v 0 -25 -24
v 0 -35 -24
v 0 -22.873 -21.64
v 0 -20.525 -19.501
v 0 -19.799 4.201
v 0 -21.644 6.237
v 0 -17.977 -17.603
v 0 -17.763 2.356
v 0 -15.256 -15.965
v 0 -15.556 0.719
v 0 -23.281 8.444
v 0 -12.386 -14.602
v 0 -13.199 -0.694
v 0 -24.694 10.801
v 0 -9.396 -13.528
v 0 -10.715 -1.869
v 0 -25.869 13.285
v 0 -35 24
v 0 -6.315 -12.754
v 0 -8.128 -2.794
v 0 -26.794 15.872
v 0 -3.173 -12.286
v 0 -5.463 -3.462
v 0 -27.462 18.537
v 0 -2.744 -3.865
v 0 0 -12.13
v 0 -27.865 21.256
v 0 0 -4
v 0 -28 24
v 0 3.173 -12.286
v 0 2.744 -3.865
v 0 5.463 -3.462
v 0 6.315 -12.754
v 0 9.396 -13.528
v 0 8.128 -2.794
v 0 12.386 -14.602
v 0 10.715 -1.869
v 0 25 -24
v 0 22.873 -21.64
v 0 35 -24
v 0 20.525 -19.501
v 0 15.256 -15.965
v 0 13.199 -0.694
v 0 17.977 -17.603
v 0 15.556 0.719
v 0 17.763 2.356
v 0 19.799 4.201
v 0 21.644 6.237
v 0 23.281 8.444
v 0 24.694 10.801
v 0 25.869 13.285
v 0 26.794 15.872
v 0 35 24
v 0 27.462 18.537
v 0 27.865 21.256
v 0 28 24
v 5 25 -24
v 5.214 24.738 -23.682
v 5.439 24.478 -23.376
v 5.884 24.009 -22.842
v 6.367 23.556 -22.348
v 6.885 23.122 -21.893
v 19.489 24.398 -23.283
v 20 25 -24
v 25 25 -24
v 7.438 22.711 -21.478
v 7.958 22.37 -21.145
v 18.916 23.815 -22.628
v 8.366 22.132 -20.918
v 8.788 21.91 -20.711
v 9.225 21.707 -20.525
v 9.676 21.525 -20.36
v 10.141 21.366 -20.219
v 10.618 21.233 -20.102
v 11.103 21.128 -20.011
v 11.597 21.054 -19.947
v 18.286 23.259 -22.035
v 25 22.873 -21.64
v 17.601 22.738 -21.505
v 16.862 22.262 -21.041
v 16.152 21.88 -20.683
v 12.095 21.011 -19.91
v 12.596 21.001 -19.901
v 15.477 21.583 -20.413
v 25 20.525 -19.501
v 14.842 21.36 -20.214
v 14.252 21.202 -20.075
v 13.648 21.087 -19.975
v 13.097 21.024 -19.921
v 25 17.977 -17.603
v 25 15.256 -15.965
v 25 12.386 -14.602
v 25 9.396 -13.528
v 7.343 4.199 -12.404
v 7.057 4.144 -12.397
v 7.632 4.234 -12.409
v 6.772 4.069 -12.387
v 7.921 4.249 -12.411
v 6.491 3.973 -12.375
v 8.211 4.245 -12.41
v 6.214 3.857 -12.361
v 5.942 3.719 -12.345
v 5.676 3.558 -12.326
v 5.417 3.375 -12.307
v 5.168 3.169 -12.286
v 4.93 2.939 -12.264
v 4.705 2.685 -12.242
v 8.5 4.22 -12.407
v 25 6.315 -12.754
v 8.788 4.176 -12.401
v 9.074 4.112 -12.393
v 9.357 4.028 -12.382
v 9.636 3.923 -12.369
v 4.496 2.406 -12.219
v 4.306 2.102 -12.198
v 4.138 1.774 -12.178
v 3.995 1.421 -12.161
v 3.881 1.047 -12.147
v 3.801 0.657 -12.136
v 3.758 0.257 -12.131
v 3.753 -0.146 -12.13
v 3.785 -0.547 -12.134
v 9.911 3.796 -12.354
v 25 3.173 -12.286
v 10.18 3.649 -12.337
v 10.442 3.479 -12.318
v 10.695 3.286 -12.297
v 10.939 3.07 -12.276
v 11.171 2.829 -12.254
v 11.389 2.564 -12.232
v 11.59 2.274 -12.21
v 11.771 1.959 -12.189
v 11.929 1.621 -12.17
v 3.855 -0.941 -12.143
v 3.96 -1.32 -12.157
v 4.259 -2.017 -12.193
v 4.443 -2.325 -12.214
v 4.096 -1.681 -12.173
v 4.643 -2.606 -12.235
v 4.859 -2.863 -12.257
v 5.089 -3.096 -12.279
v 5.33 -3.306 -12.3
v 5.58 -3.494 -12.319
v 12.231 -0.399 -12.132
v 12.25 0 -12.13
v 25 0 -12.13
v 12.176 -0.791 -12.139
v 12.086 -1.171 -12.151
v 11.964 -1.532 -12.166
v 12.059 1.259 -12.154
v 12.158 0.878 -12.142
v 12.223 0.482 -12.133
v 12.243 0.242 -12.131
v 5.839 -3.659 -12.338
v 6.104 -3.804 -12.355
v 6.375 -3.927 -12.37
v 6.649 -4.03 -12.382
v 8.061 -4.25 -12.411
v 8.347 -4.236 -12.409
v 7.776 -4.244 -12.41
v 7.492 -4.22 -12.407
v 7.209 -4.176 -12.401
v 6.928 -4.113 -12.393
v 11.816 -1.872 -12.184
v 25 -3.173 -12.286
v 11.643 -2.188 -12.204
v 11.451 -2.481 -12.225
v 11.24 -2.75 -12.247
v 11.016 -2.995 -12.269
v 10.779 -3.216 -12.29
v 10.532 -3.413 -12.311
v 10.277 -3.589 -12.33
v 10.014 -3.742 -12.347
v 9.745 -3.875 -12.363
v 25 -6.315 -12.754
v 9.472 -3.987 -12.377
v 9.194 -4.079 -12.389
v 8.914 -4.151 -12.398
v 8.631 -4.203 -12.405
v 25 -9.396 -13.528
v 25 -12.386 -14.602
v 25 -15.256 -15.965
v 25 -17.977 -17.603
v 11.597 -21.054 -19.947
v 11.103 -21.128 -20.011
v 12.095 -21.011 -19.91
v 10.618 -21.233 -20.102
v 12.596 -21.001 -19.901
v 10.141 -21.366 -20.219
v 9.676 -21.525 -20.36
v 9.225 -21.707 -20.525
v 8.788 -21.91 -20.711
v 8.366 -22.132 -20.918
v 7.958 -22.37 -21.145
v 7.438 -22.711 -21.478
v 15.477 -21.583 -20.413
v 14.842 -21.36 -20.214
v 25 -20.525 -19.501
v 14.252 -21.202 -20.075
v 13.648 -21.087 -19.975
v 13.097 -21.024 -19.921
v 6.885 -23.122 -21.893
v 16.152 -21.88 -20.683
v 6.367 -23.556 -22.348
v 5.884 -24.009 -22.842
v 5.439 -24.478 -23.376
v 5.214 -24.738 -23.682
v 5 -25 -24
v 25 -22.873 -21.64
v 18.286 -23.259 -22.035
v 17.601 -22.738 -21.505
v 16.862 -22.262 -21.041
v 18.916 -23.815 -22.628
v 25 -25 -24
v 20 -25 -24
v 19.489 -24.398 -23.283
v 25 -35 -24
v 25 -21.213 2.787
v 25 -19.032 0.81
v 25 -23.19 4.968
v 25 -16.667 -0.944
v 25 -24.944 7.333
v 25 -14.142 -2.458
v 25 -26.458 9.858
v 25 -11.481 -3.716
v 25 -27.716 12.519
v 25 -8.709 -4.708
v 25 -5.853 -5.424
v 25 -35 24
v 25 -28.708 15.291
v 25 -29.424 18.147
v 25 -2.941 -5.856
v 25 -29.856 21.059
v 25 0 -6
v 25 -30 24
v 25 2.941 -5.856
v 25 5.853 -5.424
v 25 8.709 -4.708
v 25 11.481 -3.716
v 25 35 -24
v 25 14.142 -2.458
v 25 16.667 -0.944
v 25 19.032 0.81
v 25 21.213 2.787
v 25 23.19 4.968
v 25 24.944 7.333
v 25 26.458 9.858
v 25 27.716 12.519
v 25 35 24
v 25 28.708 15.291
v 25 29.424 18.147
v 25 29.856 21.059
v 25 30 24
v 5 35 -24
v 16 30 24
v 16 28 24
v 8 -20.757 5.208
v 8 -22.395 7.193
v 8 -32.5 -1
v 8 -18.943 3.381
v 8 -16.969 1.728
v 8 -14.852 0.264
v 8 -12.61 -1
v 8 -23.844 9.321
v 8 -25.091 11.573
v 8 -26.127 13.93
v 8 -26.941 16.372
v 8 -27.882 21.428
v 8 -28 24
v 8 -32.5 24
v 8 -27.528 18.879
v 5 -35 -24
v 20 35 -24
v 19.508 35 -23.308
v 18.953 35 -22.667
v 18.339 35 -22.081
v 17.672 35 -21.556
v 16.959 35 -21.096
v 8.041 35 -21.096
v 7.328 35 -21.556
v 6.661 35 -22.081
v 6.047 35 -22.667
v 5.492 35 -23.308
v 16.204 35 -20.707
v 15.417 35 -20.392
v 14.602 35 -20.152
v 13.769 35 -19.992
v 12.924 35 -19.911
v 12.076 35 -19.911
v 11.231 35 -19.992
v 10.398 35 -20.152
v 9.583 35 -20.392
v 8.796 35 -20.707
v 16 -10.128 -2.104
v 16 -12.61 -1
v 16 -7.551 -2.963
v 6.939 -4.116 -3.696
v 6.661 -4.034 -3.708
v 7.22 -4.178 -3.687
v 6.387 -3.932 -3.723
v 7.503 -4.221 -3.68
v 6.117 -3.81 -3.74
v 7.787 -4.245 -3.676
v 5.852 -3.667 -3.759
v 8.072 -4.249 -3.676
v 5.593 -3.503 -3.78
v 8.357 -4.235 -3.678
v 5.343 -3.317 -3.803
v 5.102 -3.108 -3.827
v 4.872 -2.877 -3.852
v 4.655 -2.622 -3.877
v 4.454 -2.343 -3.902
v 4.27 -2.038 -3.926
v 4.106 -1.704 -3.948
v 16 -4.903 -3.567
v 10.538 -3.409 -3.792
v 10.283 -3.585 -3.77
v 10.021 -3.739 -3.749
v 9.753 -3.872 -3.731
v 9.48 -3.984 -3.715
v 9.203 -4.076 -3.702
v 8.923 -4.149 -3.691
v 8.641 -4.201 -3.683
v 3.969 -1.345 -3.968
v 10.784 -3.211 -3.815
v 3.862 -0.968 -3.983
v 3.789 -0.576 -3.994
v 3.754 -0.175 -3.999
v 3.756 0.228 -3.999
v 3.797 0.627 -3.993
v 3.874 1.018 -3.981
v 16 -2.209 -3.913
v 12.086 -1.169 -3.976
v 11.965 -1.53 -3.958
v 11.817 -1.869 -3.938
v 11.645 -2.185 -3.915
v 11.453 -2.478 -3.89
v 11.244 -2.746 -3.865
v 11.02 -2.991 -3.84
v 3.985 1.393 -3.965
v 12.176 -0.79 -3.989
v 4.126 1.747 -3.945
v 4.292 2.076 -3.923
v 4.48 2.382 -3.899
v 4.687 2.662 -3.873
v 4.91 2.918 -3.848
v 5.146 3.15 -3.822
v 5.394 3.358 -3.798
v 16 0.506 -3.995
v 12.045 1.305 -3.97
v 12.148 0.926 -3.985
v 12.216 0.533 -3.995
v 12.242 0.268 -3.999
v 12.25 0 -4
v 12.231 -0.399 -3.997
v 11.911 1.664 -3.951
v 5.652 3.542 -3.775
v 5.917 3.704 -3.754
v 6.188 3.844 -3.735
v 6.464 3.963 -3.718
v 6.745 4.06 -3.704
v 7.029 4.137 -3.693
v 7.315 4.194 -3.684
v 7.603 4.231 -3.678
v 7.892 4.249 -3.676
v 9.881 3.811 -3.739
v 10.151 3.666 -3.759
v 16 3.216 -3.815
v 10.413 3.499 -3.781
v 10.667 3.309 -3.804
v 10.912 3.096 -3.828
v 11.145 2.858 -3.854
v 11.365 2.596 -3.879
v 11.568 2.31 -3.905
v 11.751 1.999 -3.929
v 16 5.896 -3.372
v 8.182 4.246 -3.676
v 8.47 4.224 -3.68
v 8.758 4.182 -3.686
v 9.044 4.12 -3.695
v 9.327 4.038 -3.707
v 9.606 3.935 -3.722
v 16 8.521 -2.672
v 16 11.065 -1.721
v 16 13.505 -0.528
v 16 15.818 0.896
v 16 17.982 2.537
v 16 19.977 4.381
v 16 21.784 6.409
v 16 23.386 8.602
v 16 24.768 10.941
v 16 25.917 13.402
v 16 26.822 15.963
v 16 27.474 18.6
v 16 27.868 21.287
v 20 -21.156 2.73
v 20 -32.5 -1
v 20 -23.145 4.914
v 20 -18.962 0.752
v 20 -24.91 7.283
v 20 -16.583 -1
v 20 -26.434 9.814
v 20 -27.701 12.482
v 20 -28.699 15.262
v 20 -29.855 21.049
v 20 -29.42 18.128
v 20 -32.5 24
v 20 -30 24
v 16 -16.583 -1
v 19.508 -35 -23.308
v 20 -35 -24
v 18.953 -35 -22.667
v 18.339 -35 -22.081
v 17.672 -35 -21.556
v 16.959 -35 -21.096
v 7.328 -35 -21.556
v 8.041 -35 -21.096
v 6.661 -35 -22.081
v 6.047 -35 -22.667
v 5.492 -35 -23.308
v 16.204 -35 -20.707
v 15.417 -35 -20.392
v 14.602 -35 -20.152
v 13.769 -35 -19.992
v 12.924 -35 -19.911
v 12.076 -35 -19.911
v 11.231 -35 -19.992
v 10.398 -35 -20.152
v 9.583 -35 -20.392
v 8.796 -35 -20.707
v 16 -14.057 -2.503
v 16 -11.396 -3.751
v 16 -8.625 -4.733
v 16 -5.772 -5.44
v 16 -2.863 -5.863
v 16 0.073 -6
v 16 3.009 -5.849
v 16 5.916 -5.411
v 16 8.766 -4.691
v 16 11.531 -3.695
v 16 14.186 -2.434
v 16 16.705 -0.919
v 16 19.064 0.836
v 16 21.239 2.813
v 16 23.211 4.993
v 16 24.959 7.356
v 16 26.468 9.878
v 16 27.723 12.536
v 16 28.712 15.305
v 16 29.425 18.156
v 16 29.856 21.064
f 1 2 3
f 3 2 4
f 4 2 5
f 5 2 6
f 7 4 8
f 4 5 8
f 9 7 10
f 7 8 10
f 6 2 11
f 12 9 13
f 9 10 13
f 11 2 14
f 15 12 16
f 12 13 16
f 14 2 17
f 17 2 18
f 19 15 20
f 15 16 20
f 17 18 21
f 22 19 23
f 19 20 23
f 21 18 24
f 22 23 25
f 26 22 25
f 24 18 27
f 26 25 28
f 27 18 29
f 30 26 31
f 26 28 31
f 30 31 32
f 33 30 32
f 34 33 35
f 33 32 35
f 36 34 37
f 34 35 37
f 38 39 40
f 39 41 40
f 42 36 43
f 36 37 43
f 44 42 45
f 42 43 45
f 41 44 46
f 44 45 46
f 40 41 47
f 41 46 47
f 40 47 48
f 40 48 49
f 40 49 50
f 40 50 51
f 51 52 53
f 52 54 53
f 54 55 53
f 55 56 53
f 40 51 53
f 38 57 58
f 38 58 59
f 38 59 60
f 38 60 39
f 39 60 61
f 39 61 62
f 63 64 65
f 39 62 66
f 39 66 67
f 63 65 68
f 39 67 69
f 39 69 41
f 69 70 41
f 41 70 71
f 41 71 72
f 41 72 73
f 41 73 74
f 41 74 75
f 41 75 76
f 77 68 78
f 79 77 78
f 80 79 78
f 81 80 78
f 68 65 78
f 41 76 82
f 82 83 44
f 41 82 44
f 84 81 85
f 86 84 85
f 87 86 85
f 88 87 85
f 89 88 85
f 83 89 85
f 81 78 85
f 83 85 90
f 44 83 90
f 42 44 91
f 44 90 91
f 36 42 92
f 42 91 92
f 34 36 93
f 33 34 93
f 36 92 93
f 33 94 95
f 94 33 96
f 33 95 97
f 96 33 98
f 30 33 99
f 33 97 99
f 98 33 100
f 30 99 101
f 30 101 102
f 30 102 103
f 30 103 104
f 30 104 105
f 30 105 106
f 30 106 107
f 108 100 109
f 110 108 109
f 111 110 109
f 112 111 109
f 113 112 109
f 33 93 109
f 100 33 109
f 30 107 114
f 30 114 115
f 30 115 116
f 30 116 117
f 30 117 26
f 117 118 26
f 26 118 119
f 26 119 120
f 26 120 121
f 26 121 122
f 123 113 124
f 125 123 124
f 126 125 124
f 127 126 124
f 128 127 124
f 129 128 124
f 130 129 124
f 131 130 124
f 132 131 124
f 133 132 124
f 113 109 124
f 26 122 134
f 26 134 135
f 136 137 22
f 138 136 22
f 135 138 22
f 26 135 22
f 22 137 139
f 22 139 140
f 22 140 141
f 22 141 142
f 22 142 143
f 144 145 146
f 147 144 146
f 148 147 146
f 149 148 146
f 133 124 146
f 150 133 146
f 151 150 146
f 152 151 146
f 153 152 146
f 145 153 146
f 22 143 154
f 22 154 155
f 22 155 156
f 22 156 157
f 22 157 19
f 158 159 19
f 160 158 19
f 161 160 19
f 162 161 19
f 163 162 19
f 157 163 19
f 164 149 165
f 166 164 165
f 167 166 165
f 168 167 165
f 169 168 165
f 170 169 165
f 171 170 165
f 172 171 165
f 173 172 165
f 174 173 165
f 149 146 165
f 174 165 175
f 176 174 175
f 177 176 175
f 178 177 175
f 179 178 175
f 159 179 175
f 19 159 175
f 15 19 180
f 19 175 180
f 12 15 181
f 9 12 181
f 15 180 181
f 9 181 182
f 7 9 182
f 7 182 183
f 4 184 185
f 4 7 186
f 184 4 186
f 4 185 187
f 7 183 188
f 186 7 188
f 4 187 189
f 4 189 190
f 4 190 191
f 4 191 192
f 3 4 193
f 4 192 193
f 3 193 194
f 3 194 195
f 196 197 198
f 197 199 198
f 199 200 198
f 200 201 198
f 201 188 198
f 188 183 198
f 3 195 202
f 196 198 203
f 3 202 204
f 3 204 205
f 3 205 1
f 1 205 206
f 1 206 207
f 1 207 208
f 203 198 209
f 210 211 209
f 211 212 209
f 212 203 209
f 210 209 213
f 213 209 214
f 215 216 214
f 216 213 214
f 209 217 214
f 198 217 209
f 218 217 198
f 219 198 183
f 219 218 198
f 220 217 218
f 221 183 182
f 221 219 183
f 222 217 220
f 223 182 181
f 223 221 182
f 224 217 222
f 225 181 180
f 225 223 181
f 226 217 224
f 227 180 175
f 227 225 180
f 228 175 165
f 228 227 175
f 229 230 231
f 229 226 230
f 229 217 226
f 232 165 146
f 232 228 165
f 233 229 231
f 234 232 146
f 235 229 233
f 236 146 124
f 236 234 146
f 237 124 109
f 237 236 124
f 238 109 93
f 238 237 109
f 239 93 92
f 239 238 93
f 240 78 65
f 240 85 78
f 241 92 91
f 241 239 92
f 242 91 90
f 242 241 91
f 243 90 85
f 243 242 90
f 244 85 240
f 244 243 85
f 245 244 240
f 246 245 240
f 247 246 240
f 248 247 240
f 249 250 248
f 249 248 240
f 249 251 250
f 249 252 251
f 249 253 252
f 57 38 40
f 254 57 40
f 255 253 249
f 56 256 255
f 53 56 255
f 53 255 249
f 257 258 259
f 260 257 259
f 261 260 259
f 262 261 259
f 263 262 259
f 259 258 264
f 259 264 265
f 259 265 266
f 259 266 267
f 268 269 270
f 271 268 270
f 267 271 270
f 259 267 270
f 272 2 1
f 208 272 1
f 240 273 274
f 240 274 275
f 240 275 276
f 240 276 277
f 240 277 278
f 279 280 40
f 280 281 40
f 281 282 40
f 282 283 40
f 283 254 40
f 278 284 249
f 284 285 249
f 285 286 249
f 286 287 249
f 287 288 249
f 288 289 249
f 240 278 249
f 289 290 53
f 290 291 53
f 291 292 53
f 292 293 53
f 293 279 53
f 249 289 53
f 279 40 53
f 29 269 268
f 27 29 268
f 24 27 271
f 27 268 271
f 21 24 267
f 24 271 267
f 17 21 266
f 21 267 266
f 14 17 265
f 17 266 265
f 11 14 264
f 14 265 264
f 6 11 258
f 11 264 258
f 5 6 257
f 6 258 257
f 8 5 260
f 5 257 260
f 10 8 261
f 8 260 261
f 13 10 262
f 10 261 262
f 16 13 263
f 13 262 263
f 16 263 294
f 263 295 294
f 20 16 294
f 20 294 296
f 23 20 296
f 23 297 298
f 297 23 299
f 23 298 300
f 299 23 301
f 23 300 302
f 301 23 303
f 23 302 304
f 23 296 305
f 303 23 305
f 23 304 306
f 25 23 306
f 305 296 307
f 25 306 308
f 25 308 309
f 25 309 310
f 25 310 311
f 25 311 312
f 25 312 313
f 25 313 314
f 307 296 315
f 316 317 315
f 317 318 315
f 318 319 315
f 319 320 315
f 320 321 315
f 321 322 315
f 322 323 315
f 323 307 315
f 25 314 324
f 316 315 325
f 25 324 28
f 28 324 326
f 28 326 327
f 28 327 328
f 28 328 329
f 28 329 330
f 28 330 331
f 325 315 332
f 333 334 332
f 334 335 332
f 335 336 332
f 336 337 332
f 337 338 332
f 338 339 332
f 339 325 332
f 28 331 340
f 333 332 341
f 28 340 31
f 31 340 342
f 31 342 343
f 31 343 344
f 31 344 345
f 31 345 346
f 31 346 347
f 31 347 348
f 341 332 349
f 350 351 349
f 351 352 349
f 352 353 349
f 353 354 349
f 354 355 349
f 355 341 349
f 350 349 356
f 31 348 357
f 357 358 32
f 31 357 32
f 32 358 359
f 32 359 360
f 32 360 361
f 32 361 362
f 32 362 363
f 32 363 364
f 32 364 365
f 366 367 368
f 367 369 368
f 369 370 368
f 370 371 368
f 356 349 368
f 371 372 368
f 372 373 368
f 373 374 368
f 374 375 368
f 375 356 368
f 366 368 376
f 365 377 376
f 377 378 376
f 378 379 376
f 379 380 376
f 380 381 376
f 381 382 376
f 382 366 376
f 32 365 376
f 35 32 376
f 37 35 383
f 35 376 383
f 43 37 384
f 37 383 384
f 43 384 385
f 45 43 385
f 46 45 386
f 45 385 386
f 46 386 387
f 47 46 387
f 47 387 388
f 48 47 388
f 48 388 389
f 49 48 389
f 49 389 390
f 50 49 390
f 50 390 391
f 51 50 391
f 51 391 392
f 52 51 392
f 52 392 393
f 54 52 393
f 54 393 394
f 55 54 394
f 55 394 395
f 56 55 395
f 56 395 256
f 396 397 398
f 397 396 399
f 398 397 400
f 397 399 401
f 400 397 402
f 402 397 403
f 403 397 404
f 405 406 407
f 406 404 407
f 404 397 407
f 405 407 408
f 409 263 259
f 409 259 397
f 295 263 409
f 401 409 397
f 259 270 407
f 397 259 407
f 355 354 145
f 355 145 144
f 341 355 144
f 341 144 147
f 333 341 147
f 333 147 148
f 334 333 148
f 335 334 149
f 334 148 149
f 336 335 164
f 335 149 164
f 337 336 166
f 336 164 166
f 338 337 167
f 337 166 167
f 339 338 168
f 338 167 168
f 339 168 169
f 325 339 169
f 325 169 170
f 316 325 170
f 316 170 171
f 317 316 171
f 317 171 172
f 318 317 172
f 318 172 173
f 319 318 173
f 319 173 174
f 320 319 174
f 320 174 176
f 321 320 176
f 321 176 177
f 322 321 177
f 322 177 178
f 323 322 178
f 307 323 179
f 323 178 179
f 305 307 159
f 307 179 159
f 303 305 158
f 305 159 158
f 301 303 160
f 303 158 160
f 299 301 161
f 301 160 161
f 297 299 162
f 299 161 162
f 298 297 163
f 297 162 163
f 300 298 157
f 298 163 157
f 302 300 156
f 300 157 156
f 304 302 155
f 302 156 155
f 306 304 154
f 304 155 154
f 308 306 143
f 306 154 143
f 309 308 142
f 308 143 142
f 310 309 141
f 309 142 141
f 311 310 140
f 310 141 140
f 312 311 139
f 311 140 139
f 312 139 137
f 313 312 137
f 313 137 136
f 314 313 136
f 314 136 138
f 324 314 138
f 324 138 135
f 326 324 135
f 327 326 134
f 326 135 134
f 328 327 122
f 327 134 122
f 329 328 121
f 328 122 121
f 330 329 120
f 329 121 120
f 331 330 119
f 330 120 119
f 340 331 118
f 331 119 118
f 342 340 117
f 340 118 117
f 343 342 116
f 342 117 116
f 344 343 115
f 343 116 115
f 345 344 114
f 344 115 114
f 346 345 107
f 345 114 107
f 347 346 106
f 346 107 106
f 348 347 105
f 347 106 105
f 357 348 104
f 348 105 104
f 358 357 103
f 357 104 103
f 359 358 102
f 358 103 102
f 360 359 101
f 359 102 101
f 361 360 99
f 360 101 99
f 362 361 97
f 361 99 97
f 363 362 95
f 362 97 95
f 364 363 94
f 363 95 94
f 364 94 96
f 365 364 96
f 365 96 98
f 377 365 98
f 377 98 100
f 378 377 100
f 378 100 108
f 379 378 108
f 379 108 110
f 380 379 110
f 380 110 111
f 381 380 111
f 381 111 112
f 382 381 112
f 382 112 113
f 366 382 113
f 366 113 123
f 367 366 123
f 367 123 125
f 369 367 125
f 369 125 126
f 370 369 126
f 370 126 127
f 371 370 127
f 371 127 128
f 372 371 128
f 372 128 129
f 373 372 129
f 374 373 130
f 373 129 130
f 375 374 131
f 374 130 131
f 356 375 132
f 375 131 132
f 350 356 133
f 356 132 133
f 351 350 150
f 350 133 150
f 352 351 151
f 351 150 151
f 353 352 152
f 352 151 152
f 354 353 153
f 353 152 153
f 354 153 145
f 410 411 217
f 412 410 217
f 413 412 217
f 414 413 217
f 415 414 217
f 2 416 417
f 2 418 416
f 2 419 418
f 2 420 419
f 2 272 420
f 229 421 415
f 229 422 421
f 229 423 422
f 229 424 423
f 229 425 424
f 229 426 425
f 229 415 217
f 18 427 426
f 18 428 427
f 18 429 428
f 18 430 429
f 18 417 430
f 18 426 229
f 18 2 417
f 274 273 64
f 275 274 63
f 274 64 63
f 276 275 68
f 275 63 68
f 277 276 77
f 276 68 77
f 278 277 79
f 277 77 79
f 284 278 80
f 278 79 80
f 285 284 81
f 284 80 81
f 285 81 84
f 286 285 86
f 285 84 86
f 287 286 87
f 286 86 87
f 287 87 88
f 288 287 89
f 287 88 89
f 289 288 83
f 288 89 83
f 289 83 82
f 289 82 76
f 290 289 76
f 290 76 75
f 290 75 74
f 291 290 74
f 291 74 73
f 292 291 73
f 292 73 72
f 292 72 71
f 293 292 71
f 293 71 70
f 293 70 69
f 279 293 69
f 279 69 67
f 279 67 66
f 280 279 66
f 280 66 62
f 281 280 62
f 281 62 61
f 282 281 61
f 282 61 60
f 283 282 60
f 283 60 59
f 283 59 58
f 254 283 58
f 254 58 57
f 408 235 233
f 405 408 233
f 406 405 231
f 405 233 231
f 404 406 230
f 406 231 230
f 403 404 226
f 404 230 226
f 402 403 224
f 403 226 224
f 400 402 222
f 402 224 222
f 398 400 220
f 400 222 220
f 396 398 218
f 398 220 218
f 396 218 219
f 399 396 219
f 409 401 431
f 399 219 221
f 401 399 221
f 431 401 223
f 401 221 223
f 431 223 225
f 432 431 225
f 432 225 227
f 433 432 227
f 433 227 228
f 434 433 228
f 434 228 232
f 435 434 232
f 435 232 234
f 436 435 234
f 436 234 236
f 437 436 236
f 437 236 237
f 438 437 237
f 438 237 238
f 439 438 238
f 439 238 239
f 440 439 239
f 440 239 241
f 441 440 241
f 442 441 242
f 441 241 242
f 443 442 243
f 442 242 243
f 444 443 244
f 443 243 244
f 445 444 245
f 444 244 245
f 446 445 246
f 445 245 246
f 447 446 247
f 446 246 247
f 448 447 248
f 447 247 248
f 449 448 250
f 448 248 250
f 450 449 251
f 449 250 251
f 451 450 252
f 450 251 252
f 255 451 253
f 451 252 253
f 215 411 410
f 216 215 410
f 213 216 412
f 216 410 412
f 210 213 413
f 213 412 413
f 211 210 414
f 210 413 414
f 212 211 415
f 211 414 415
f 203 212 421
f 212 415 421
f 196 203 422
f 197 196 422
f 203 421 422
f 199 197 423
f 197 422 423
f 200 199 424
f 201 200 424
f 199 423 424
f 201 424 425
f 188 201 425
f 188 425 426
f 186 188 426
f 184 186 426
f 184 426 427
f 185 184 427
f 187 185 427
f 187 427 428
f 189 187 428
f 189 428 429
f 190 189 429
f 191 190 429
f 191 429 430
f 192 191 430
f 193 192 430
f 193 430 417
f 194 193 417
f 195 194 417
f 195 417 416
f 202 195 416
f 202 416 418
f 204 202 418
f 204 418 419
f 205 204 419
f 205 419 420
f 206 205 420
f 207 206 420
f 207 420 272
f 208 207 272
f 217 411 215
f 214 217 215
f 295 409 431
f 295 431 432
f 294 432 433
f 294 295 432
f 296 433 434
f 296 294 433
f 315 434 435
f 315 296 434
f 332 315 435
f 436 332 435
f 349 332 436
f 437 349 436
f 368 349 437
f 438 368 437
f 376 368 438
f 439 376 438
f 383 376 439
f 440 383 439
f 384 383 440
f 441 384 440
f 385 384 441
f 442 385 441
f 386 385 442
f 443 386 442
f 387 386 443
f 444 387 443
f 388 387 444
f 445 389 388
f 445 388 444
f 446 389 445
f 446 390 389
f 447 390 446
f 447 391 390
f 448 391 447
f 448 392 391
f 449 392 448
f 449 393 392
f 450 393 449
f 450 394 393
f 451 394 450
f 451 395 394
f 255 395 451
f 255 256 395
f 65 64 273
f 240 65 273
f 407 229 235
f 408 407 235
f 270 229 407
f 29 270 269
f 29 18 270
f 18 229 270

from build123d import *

# Parameters (mm, degrees)
F0_W      = 70
F0_H      = 48
F1_DEPTH  = 25
F2_R      = 30
F3_DEPTH  = 9
F4_R      = 28
F5_DEPTH  = 25
F6_R      = 4.25
F7_DEPTH  = 25
F9_DEPTH  = 25
F11_DEPTH = 25
F13_DEPTH = 75


with BuildPart() as f1:
    # F0 (on Right) → F1 (new body)
    with BuildSketch(Plane.YZ):
        Rectangle(F0_W, F0_H)
    extrude(amount=F1_DEPTH)

    # F2 (on face) → F3 (cut)
    with BuildSketch(Plane.YZ.offset(25)):
        with Locations((0, 24)):
            Circle(F2_R)
    extrude(amount=-F3_DEPTH, mode=Mode.SUBTRACT)

    # F4 (on face) → F5 (cut)
    with BuildSketch(Plane.YZ.offset(16)):
        with Locations((0, 24)):
            Circle(F4_R)
    extrude(amount=-F5_DEPTH, mode=Mode.SUBTRACT)

    # F6 (on face) → F7 (cut)
    with BuildSketch(Plane(origin=(0, 0, -24), x_dir=(1, 0, 0), z_dir=(0, 0, -1))):
        with Locations((8, 0)):
            Circle(F6_R)
    extrude(amount=-F7_DEPTH, mode=Mode.SUBTRACT)

    # F8 (on face) → F9 (cut)
    with BuildSketch(Plane.XY.offset(24)):
        Polygon((8, -28), (8, -32.5), (20, -32.5), (20, -27.5), (20, -10), (8, -10), align=None)
    extrude(amount=-F9_DEPTH, mode=Mode.SUBTRACT)

    # F10 (on face) → F11 (cut)
    with BuildSketch(Plane.YZ.offset(25)):
        with BuildLine():
            Line((25, -30.528549), (25, -24))
            ThreePointArc((25, -24), (0, -12.129655), (-25, -24))
            Line((-25, -24), (-25, -30.528549))
            Line((-25, -30.528549), (25, -30.528549))
        make_face()
    extrude(amount=-F11_DEPTH, mode=Mode.SUBTRACT)

    # F12 (on face) → F13 (cut)
    with BuildSketch(Plane.XZ.offset(35)):
        with BuildLine():
            Line((20, -27.683428), (20, -24))
            ThreePointArc((20, -24), (12.5, -19.900788), (5, -24))
            Line((5, -24), (5, -27.683428))
            Line((5, -27.683428), (20, -27.683428))
        make_face()
    extrude(amount=-F13_DEPTH, mode=Mode.SUBTRACT)


solid = f1.part
